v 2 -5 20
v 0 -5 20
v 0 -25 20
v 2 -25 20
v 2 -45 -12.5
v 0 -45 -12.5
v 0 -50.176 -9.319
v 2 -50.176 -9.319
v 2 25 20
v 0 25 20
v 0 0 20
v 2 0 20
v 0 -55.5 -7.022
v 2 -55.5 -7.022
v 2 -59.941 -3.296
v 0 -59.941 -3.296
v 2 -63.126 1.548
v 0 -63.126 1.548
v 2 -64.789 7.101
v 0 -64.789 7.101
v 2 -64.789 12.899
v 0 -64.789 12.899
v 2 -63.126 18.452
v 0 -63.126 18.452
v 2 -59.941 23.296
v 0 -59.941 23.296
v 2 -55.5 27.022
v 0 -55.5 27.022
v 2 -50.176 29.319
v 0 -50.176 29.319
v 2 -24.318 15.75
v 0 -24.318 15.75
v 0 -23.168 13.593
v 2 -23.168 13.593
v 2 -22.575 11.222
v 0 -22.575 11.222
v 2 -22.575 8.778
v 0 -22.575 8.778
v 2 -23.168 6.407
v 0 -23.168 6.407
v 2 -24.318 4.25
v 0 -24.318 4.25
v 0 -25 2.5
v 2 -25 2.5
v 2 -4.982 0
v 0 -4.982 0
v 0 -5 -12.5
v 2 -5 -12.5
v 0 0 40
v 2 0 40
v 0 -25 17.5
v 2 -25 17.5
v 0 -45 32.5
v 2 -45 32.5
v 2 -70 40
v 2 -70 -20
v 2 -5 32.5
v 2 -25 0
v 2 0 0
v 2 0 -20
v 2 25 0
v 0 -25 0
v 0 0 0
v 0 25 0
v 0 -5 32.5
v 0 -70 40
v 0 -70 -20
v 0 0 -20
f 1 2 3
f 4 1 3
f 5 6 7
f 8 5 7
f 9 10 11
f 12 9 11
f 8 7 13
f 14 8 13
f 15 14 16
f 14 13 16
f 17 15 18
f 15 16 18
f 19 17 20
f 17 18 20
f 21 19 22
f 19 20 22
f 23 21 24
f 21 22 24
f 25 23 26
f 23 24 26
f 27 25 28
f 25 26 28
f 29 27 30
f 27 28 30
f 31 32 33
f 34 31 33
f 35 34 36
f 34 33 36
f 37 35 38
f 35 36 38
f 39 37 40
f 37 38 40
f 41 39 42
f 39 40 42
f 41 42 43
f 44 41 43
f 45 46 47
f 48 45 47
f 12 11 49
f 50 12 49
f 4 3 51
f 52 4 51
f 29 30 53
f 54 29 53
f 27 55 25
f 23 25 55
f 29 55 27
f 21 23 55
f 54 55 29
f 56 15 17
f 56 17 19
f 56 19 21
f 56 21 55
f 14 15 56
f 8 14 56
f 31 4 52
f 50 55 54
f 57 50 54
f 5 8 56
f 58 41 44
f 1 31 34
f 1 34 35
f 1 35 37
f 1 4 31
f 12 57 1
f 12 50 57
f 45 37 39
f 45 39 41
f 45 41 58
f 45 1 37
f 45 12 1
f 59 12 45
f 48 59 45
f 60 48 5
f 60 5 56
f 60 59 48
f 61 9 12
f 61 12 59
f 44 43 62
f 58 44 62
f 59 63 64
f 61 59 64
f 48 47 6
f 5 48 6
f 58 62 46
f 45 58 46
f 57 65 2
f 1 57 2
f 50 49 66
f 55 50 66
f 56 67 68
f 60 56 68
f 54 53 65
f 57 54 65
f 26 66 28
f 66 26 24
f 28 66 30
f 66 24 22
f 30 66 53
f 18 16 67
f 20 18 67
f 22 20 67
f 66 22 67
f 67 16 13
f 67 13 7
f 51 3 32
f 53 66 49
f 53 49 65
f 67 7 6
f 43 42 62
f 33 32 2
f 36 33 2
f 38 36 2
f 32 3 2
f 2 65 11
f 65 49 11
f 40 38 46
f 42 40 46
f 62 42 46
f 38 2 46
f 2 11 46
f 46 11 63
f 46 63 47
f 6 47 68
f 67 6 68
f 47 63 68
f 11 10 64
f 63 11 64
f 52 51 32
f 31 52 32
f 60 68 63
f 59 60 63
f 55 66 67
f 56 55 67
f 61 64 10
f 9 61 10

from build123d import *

# Parameters (mm, degrees)
BOSS_EXTRUDE1_DEPTH = 2


with BuildPart() as part:
    # Sketch1 → Boss-Extrude1 (new body)
    with BuildSketch(Plane(origin=(0, 0, 0), x_dir=(0, 0, -1), z_dir=(1, 0, 0))):
        Polygon((20, 0), (0, 0), (0, 25), (-20, 25), (-20, 0), (-40, 0), (-40, -70), (20, -70), align=None)
        with BuildLine():
            ThreePointArc((9.318516526, -50.176380902), (-10, -65), (-29.318516526, -50.176380902))
            Line((-29.318516526, -50.176380902), (-32.5, -45))
            Line((-32.5, -45), (-32.5, -5))
            Line((-32.5, -5), (-20, -5))
            Line((-20, -5), (-20, -25))
            Line((-20, -25), (-17.5, -25))
            Line((-17.5, -25), (-15.75, -24.318465914))
            ThreePointArc((-15.75, -24.318465914), (-10, -22.5), (-4.25, -24.318465914))
            Line((-4.25, -24.318465914), (-2.5, -25))
            Line((-2.5, -25), (0, -25))
            Line((0, -25), (0, -4.981590289))
            Line((0, -4.981590289), (12.5, -5))
            Line((12.5, -5), (12.5, -45))
            Line((12.5, -45), (9.318516526, -50.176380902))
        make_face(mode=Mode.SUBTRACT)
    extrude(amount=BOSS_EXTRUDE1_DEPTH)


solid = part.part
